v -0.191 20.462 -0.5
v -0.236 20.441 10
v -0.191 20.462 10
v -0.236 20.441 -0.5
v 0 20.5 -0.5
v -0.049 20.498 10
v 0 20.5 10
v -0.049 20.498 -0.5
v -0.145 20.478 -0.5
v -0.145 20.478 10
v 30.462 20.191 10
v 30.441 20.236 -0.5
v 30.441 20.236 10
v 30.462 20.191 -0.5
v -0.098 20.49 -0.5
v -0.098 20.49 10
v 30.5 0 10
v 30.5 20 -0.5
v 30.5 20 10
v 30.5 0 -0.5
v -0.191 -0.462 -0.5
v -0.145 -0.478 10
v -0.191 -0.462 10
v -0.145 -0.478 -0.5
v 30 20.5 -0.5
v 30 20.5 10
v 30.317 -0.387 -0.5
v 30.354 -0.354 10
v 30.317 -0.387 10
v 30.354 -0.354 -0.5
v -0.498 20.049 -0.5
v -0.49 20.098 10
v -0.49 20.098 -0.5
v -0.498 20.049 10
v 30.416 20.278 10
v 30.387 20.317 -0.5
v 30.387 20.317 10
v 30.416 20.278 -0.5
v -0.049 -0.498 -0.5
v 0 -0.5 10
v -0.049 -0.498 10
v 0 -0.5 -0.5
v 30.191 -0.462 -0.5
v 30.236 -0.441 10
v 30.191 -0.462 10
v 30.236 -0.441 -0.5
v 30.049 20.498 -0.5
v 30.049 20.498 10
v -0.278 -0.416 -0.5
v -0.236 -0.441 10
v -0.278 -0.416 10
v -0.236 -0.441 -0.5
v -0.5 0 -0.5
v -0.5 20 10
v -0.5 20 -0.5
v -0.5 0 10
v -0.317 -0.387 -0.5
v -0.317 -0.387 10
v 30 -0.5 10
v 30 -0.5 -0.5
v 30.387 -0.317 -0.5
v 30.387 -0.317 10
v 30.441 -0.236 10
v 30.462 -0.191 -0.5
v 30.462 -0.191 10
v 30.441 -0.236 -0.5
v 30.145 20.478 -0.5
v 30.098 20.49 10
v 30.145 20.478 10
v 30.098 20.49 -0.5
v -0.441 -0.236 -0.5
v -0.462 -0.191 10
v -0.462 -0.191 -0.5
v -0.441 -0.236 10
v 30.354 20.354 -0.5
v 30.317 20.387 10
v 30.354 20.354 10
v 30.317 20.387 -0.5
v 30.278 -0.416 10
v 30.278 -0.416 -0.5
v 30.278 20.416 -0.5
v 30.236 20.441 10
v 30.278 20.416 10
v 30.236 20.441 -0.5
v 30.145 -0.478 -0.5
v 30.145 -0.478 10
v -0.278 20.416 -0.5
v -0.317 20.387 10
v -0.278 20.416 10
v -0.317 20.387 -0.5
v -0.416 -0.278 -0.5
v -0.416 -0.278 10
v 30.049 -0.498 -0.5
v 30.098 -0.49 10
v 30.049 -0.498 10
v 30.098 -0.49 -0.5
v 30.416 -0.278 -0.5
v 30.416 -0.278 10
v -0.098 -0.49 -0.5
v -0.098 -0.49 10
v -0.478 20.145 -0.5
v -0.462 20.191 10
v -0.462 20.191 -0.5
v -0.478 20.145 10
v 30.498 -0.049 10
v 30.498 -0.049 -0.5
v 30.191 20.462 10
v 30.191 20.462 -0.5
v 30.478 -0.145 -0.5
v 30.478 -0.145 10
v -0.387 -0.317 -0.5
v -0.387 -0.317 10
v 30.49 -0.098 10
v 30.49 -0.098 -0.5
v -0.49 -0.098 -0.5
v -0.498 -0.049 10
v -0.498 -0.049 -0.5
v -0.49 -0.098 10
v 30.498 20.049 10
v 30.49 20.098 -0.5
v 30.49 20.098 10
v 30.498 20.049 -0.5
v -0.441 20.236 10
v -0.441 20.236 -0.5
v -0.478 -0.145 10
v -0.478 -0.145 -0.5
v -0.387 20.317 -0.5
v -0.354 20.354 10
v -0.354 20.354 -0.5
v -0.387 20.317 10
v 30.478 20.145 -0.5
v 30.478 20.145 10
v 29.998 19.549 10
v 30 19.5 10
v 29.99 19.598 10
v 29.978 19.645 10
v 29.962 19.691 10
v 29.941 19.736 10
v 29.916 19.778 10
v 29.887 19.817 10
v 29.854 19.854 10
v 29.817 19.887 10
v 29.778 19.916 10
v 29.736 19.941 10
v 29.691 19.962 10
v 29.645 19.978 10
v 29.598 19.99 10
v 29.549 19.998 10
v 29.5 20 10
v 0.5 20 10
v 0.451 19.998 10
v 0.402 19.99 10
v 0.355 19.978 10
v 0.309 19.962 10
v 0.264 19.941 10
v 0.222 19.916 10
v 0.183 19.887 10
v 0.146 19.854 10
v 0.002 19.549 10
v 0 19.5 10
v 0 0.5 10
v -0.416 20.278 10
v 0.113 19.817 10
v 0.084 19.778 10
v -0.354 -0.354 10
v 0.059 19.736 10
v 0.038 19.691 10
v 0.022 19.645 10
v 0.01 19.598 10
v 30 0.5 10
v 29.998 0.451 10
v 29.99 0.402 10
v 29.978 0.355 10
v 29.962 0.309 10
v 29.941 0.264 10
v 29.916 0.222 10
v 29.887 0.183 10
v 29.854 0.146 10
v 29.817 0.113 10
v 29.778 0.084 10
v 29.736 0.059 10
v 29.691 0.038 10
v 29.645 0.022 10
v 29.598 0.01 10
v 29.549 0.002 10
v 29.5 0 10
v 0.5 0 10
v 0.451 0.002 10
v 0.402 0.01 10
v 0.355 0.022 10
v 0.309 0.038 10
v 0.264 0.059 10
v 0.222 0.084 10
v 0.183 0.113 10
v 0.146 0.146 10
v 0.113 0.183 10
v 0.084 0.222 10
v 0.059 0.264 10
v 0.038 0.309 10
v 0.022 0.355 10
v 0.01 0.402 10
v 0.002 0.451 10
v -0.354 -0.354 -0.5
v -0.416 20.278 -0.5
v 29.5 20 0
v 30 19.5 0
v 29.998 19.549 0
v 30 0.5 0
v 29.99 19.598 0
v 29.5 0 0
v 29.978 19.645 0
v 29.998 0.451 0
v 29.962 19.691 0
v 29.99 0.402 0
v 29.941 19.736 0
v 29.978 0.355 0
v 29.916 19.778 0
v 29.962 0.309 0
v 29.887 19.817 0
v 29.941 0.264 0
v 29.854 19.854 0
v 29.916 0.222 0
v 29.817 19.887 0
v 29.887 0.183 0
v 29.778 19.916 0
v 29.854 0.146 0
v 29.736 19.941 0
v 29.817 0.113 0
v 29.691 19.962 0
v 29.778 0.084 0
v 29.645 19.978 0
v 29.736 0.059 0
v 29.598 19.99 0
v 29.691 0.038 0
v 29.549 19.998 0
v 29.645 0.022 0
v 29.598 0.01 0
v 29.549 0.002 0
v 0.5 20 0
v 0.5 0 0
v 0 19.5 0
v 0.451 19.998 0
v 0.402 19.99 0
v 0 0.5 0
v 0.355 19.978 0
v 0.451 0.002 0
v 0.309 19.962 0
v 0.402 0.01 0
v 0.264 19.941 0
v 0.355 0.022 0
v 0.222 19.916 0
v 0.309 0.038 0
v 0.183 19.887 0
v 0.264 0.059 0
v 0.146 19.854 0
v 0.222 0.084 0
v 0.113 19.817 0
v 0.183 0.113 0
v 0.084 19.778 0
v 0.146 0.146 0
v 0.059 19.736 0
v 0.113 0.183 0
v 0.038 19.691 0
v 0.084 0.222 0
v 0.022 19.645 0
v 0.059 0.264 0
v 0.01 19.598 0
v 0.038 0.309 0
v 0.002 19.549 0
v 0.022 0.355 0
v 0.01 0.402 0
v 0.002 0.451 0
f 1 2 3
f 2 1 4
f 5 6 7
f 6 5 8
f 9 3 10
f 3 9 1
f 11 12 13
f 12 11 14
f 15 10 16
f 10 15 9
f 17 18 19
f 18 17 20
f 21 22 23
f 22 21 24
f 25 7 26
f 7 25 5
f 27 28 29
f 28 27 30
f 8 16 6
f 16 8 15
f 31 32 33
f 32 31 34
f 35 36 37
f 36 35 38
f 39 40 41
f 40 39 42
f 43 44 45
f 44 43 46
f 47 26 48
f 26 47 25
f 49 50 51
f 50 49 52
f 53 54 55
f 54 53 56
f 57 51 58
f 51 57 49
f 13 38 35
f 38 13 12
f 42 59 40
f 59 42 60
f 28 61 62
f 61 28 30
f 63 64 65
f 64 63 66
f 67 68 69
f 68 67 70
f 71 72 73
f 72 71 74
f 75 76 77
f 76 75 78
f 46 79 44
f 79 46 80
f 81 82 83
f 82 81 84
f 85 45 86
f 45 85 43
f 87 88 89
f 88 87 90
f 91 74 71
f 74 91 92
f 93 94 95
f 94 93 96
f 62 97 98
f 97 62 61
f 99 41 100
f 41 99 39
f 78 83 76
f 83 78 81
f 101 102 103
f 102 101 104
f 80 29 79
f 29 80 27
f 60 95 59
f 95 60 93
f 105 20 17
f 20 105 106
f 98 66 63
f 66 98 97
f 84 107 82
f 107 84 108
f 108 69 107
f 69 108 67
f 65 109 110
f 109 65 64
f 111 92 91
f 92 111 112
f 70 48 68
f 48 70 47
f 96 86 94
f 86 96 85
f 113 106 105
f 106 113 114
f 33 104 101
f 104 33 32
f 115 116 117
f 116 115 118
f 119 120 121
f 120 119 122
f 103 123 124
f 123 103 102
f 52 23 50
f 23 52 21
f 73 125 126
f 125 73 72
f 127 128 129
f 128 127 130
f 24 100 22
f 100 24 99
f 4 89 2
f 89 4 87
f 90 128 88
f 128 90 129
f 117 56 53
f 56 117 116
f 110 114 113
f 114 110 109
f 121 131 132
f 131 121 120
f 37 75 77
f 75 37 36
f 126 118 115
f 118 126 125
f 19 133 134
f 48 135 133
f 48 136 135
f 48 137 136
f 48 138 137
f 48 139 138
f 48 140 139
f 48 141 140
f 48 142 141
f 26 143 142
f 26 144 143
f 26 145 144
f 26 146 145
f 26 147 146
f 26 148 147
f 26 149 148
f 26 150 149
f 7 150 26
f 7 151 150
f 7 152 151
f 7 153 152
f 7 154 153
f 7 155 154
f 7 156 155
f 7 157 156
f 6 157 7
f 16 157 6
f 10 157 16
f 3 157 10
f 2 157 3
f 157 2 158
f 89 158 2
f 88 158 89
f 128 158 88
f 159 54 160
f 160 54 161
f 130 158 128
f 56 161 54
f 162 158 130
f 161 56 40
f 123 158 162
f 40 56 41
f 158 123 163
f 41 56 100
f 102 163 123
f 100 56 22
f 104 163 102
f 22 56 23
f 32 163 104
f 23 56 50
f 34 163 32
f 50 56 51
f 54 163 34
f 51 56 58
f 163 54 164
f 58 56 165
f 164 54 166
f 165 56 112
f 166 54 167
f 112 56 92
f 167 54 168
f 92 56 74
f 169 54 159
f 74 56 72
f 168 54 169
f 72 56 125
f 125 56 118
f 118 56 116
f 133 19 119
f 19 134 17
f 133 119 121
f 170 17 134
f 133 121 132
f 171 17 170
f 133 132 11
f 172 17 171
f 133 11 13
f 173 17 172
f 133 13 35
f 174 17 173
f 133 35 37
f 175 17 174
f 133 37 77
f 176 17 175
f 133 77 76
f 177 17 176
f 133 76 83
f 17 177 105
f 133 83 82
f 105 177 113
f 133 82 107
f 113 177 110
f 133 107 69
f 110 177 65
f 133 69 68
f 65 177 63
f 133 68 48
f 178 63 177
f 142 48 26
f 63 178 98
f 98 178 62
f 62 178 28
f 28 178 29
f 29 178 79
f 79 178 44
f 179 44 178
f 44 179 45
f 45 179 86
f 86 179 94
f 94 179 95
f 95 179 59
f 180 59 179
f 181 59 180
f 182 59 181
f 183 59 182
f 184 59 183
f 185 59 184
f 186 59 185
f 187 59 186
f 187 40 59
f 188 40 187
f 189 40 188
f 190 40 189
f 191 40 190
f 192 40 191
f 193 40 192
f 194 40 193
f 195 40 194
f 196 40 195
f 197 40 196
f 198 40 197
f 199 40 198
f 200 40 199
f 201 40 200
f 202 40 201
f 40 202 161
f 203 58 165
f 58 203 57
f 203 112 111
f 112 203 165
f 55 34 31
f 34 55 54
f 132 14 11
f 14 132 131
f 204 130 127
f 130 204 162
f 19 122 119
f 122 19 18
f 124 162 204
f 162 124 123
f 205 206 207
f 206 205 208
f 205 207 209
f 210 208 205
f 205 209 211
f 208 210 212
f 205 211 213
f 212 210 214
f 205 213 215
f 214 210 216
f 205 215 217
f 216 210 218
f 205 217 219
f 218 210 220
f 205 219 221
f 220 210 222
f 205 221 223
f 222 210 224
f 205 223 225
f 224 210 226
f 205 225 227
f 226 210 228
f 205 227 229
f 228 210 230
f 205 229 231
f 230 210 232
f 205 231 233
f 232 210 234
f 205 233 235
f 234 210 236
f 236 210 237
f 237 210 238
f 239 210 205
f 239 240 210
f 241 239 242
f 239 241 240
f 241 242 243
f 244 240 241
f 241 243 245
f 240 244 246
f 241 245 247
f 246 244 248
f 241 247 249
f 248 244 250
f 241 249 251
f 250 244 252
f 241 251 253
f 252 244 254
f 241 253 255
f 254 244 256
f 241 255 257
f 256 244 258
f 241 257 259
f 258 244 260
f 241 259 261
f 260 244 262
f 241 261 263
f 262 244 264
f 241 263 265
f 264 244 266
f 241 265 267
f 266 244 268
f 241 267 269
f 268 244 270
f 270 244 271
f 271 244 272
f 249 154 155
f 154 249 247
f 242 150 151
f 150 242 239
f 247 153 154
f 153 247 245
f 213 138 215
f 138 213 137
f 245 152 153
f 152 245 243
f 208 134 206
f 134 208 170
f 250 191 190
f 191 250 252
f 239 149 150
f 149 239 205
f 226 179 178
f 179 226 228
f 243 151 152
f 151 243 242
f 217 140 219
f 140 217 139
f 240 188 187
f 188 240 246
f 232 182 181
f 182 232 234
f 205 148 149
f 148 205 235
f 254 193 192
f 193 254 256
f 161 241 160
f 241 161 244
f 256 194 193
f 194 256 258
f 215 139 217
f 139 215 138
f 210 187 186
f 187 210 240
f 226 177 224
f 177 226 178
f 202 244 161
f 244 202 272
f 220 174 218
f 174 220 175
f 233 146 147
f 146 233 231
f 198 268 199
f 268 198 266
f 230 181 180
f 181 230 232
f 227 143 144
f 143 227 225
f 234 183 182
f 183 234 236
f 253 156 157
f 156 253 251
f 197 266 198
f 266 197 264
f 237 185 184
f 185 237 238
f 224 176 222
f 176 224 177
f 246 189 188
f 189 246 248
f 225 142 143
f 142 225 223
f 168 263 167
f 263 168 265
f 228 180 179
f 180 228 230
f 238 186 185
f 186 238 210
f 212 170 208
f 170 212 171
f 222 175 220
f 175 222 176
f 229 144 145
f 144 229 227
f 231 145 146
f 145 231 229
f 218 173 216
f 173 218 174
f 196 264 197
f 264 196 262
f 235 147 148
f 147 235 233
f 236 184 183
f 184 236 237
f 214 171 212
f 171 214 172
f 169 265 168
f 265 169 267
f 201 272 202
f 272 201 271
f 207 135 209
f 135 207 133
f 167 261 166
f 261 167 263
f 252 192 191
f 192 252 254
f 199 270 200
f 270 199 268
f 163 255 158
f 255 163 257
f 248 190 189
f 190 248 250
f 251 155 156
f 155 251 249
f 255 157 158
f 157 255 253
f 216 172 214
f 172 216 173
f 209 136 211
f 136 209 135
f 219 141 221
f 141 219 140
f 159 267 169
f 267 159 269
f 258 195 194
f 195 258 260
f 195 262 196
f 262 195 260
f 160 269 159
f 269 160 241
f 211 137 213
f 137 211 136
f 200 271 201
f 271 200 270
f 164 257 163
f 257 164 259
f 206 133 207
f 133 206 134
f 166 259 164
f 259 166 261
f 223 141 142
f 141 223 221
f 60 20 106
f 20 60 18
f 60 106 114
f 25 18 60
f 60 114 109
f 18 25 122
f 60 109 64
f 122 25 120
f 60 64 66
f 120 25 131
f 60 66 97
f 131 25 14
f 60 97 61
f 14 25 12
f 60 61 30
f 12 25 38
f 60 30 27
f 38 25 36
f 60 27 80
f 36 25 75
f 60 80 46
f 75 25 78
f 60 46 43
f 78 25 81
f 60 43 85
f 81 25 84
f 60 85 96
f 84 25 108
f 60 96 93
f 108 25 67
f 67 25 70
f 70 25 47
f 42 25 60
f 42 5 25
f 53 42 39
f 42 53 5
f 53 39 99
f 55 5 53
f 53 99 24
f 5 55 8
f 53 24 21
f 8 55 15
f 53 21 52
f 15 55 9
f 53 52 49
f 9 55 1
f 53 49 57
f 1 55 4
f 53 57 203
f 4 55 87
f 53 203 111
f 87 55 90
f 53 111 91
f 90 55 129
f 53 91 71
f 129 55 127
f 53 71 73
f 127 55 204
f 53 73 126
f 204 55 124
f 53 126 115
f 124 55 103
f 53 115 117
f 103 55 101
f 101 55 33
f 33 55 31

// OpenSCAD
// file: lib/RoundedSquare.scad
module RoundedSquare(
        width_i,
        depth_i,
        radius )
{
    union () {
        translate( [ -radius, 0 ] ) {
            square( [ width_i+2*radius, depth_i ] );
        }

        translate( [ 0, -radius ] ) {
            square( [ width_i, depth_i+2*radius ] );
        }

        circle( r=radius );

        translate( [ width_i, 0 ] ) {
            circle( r=radius );
        }
        translate( [ 0, depth_i ] ) {
            circle( r=radius );
        }
        translate( [ width_i, depth_i ] ) {
            circle( r=radius );
        }
    }
}
// file: lib/HalfBox.scad
// Half a box, bottom/ceiling at the bottom, [0,0,0] just inside

use <RoundedSquare.scad>

module HalfBox(
    width_i,
    depth_i,
    height_i,
    wall_d )
{
    union() {
        translate( [ 0, 0, -wall_d ] ) {
            linear_extrude( wall_d ) {
                RoundedSquare( width_i, depth_i, wall_d );
            }
        }
    }

    difference() {
        linear_extrude( height_i ) {
            RoundedSquare( width_i, depth_i, wall_d );
        }
        linear_extrude( height_i ) {
            translate( [ wall_d, wall_d, 0 ]) {
                RoundedSquare( width_i-2*wall_d, depth_i-2*wall_d, wall_d );
            }
        }
    }


if( false ) {
    union() {
// faces
        // bottom
        translate( [ -wall_d, -wall_d, -wall_d ] ) {
            cube( [ width_i+2*wall_d, depth_i+2*wall_d, wall_d ]);
        }

        // front
        translate( [0,-wall_d,0] ) {
            cube( [ width_i, wall_d, height_i ]);
        }

        // back
        translate( [0,depth_i,0] ) {
            cube( [ width_i, wall_d, height_i ]);
        }
        
        // left
        translate( [-wall_d,0,0] ) {
            cube( [ wall_d, depth_i, height_i ]);
        }
        
        // right
        translate( [width_i,0,0] ) {
            cube( [ wall_d, depth_i, height_i ]);
        }
// edges
        // front-left
        rotate( a=180, v=[0,0,1] ) {
            HalfBox_RoundedEdge( height_i, wall_d );
        }

        // back-left
        translate( [ 0, depth_i, 0 ])
        rotate( a=90, v=[0,0,1] ) {
            HalfBox_RoundedEdge( height_i, wall_d );
        }
            
        // front-right
        translate( [ width_i, 0, 0 ])
        rotate( a=-90, v=[0,0,1] ) {
            HalfBox_RoundedEdge( height_i, wall_d );
        }
        
        // back-right
        translate( [ width_i, depth_i, 0 ]) {
            HalfBox_RoundedEdge( height_i, wall_d );
        }
        
        // front-bottom
        rotate( a=-90, v=[1,0,0] )
        rotate( a=90, v=[0,1,0] ) {
            HalfBox_RoundedEdge( width_i, wall_d );
        }
        
        // back-bottom
        translate( [ 0, depth_i, 0 ])
        rotate( a=90, v=[0,1,0] ) {
            HalfBox_RoundedEdge( width_i, wall_d );
        }

        // left-bottom
        rotate( a=90, v=[0,1,0] )
        rotate( a=-90, v=[1,0,0] ) {    
            HalfBox_RoundedEdge( depth_i, wall_d );
        }
           
        // right-bottom
        translate( [ width_i, 0, 0 ])
        rotate( a=-90, v=[1,0,0] ) {    
            HalfBox_RoundedEdge( depth_i, wall_d );
        }

// corners
        // front-bottom-left
        rotate( a=180, v=[0,1,0] )
        rotate( a=90, v=[1,0,0] ) {
            HalfBox_RoundedCorner( wall_d );
        }

        // back-bottom-left
        translate( [ 0, depth_i, 0 ])
        rotate( a=180, v=[0,1,0] ) {
            HalfBox_RoundedCorner( wall_d );
        }

        // front-bottom-right
        translate( [ width_i, 0, 0 ])
        rotate( a=90, v=[0,1,0] )
        rotate( a=90, v=[1,0,0] ) {
            HalfBox_RoundedCorner( wall_d );
        }

        // back-bottom-right
        translate( [ width_i, depth_i, 0 ])
        rotate( a=-90, v=[1,0,0] ) {
            HalfBox_RoundedCorner( wall_d );
        }
    }
}
}

module HalfBox_RoundedEdge(
        length,
        radius )
{
	intersection() {
		cube( [ radius, radius, length ] );
		cylinder( length, radius, radius );
	}
	
}

module HalfBox_RoundedCorner(
        radius )
{
	intersection() {
    	cube( [ radius, radius, radius ]);
	    sphere( radius );
	}
}
// main file
use <lib/HalfBox.scad>

$fn=64;

HalfBox( 30, 20, 10, 0.5 );
